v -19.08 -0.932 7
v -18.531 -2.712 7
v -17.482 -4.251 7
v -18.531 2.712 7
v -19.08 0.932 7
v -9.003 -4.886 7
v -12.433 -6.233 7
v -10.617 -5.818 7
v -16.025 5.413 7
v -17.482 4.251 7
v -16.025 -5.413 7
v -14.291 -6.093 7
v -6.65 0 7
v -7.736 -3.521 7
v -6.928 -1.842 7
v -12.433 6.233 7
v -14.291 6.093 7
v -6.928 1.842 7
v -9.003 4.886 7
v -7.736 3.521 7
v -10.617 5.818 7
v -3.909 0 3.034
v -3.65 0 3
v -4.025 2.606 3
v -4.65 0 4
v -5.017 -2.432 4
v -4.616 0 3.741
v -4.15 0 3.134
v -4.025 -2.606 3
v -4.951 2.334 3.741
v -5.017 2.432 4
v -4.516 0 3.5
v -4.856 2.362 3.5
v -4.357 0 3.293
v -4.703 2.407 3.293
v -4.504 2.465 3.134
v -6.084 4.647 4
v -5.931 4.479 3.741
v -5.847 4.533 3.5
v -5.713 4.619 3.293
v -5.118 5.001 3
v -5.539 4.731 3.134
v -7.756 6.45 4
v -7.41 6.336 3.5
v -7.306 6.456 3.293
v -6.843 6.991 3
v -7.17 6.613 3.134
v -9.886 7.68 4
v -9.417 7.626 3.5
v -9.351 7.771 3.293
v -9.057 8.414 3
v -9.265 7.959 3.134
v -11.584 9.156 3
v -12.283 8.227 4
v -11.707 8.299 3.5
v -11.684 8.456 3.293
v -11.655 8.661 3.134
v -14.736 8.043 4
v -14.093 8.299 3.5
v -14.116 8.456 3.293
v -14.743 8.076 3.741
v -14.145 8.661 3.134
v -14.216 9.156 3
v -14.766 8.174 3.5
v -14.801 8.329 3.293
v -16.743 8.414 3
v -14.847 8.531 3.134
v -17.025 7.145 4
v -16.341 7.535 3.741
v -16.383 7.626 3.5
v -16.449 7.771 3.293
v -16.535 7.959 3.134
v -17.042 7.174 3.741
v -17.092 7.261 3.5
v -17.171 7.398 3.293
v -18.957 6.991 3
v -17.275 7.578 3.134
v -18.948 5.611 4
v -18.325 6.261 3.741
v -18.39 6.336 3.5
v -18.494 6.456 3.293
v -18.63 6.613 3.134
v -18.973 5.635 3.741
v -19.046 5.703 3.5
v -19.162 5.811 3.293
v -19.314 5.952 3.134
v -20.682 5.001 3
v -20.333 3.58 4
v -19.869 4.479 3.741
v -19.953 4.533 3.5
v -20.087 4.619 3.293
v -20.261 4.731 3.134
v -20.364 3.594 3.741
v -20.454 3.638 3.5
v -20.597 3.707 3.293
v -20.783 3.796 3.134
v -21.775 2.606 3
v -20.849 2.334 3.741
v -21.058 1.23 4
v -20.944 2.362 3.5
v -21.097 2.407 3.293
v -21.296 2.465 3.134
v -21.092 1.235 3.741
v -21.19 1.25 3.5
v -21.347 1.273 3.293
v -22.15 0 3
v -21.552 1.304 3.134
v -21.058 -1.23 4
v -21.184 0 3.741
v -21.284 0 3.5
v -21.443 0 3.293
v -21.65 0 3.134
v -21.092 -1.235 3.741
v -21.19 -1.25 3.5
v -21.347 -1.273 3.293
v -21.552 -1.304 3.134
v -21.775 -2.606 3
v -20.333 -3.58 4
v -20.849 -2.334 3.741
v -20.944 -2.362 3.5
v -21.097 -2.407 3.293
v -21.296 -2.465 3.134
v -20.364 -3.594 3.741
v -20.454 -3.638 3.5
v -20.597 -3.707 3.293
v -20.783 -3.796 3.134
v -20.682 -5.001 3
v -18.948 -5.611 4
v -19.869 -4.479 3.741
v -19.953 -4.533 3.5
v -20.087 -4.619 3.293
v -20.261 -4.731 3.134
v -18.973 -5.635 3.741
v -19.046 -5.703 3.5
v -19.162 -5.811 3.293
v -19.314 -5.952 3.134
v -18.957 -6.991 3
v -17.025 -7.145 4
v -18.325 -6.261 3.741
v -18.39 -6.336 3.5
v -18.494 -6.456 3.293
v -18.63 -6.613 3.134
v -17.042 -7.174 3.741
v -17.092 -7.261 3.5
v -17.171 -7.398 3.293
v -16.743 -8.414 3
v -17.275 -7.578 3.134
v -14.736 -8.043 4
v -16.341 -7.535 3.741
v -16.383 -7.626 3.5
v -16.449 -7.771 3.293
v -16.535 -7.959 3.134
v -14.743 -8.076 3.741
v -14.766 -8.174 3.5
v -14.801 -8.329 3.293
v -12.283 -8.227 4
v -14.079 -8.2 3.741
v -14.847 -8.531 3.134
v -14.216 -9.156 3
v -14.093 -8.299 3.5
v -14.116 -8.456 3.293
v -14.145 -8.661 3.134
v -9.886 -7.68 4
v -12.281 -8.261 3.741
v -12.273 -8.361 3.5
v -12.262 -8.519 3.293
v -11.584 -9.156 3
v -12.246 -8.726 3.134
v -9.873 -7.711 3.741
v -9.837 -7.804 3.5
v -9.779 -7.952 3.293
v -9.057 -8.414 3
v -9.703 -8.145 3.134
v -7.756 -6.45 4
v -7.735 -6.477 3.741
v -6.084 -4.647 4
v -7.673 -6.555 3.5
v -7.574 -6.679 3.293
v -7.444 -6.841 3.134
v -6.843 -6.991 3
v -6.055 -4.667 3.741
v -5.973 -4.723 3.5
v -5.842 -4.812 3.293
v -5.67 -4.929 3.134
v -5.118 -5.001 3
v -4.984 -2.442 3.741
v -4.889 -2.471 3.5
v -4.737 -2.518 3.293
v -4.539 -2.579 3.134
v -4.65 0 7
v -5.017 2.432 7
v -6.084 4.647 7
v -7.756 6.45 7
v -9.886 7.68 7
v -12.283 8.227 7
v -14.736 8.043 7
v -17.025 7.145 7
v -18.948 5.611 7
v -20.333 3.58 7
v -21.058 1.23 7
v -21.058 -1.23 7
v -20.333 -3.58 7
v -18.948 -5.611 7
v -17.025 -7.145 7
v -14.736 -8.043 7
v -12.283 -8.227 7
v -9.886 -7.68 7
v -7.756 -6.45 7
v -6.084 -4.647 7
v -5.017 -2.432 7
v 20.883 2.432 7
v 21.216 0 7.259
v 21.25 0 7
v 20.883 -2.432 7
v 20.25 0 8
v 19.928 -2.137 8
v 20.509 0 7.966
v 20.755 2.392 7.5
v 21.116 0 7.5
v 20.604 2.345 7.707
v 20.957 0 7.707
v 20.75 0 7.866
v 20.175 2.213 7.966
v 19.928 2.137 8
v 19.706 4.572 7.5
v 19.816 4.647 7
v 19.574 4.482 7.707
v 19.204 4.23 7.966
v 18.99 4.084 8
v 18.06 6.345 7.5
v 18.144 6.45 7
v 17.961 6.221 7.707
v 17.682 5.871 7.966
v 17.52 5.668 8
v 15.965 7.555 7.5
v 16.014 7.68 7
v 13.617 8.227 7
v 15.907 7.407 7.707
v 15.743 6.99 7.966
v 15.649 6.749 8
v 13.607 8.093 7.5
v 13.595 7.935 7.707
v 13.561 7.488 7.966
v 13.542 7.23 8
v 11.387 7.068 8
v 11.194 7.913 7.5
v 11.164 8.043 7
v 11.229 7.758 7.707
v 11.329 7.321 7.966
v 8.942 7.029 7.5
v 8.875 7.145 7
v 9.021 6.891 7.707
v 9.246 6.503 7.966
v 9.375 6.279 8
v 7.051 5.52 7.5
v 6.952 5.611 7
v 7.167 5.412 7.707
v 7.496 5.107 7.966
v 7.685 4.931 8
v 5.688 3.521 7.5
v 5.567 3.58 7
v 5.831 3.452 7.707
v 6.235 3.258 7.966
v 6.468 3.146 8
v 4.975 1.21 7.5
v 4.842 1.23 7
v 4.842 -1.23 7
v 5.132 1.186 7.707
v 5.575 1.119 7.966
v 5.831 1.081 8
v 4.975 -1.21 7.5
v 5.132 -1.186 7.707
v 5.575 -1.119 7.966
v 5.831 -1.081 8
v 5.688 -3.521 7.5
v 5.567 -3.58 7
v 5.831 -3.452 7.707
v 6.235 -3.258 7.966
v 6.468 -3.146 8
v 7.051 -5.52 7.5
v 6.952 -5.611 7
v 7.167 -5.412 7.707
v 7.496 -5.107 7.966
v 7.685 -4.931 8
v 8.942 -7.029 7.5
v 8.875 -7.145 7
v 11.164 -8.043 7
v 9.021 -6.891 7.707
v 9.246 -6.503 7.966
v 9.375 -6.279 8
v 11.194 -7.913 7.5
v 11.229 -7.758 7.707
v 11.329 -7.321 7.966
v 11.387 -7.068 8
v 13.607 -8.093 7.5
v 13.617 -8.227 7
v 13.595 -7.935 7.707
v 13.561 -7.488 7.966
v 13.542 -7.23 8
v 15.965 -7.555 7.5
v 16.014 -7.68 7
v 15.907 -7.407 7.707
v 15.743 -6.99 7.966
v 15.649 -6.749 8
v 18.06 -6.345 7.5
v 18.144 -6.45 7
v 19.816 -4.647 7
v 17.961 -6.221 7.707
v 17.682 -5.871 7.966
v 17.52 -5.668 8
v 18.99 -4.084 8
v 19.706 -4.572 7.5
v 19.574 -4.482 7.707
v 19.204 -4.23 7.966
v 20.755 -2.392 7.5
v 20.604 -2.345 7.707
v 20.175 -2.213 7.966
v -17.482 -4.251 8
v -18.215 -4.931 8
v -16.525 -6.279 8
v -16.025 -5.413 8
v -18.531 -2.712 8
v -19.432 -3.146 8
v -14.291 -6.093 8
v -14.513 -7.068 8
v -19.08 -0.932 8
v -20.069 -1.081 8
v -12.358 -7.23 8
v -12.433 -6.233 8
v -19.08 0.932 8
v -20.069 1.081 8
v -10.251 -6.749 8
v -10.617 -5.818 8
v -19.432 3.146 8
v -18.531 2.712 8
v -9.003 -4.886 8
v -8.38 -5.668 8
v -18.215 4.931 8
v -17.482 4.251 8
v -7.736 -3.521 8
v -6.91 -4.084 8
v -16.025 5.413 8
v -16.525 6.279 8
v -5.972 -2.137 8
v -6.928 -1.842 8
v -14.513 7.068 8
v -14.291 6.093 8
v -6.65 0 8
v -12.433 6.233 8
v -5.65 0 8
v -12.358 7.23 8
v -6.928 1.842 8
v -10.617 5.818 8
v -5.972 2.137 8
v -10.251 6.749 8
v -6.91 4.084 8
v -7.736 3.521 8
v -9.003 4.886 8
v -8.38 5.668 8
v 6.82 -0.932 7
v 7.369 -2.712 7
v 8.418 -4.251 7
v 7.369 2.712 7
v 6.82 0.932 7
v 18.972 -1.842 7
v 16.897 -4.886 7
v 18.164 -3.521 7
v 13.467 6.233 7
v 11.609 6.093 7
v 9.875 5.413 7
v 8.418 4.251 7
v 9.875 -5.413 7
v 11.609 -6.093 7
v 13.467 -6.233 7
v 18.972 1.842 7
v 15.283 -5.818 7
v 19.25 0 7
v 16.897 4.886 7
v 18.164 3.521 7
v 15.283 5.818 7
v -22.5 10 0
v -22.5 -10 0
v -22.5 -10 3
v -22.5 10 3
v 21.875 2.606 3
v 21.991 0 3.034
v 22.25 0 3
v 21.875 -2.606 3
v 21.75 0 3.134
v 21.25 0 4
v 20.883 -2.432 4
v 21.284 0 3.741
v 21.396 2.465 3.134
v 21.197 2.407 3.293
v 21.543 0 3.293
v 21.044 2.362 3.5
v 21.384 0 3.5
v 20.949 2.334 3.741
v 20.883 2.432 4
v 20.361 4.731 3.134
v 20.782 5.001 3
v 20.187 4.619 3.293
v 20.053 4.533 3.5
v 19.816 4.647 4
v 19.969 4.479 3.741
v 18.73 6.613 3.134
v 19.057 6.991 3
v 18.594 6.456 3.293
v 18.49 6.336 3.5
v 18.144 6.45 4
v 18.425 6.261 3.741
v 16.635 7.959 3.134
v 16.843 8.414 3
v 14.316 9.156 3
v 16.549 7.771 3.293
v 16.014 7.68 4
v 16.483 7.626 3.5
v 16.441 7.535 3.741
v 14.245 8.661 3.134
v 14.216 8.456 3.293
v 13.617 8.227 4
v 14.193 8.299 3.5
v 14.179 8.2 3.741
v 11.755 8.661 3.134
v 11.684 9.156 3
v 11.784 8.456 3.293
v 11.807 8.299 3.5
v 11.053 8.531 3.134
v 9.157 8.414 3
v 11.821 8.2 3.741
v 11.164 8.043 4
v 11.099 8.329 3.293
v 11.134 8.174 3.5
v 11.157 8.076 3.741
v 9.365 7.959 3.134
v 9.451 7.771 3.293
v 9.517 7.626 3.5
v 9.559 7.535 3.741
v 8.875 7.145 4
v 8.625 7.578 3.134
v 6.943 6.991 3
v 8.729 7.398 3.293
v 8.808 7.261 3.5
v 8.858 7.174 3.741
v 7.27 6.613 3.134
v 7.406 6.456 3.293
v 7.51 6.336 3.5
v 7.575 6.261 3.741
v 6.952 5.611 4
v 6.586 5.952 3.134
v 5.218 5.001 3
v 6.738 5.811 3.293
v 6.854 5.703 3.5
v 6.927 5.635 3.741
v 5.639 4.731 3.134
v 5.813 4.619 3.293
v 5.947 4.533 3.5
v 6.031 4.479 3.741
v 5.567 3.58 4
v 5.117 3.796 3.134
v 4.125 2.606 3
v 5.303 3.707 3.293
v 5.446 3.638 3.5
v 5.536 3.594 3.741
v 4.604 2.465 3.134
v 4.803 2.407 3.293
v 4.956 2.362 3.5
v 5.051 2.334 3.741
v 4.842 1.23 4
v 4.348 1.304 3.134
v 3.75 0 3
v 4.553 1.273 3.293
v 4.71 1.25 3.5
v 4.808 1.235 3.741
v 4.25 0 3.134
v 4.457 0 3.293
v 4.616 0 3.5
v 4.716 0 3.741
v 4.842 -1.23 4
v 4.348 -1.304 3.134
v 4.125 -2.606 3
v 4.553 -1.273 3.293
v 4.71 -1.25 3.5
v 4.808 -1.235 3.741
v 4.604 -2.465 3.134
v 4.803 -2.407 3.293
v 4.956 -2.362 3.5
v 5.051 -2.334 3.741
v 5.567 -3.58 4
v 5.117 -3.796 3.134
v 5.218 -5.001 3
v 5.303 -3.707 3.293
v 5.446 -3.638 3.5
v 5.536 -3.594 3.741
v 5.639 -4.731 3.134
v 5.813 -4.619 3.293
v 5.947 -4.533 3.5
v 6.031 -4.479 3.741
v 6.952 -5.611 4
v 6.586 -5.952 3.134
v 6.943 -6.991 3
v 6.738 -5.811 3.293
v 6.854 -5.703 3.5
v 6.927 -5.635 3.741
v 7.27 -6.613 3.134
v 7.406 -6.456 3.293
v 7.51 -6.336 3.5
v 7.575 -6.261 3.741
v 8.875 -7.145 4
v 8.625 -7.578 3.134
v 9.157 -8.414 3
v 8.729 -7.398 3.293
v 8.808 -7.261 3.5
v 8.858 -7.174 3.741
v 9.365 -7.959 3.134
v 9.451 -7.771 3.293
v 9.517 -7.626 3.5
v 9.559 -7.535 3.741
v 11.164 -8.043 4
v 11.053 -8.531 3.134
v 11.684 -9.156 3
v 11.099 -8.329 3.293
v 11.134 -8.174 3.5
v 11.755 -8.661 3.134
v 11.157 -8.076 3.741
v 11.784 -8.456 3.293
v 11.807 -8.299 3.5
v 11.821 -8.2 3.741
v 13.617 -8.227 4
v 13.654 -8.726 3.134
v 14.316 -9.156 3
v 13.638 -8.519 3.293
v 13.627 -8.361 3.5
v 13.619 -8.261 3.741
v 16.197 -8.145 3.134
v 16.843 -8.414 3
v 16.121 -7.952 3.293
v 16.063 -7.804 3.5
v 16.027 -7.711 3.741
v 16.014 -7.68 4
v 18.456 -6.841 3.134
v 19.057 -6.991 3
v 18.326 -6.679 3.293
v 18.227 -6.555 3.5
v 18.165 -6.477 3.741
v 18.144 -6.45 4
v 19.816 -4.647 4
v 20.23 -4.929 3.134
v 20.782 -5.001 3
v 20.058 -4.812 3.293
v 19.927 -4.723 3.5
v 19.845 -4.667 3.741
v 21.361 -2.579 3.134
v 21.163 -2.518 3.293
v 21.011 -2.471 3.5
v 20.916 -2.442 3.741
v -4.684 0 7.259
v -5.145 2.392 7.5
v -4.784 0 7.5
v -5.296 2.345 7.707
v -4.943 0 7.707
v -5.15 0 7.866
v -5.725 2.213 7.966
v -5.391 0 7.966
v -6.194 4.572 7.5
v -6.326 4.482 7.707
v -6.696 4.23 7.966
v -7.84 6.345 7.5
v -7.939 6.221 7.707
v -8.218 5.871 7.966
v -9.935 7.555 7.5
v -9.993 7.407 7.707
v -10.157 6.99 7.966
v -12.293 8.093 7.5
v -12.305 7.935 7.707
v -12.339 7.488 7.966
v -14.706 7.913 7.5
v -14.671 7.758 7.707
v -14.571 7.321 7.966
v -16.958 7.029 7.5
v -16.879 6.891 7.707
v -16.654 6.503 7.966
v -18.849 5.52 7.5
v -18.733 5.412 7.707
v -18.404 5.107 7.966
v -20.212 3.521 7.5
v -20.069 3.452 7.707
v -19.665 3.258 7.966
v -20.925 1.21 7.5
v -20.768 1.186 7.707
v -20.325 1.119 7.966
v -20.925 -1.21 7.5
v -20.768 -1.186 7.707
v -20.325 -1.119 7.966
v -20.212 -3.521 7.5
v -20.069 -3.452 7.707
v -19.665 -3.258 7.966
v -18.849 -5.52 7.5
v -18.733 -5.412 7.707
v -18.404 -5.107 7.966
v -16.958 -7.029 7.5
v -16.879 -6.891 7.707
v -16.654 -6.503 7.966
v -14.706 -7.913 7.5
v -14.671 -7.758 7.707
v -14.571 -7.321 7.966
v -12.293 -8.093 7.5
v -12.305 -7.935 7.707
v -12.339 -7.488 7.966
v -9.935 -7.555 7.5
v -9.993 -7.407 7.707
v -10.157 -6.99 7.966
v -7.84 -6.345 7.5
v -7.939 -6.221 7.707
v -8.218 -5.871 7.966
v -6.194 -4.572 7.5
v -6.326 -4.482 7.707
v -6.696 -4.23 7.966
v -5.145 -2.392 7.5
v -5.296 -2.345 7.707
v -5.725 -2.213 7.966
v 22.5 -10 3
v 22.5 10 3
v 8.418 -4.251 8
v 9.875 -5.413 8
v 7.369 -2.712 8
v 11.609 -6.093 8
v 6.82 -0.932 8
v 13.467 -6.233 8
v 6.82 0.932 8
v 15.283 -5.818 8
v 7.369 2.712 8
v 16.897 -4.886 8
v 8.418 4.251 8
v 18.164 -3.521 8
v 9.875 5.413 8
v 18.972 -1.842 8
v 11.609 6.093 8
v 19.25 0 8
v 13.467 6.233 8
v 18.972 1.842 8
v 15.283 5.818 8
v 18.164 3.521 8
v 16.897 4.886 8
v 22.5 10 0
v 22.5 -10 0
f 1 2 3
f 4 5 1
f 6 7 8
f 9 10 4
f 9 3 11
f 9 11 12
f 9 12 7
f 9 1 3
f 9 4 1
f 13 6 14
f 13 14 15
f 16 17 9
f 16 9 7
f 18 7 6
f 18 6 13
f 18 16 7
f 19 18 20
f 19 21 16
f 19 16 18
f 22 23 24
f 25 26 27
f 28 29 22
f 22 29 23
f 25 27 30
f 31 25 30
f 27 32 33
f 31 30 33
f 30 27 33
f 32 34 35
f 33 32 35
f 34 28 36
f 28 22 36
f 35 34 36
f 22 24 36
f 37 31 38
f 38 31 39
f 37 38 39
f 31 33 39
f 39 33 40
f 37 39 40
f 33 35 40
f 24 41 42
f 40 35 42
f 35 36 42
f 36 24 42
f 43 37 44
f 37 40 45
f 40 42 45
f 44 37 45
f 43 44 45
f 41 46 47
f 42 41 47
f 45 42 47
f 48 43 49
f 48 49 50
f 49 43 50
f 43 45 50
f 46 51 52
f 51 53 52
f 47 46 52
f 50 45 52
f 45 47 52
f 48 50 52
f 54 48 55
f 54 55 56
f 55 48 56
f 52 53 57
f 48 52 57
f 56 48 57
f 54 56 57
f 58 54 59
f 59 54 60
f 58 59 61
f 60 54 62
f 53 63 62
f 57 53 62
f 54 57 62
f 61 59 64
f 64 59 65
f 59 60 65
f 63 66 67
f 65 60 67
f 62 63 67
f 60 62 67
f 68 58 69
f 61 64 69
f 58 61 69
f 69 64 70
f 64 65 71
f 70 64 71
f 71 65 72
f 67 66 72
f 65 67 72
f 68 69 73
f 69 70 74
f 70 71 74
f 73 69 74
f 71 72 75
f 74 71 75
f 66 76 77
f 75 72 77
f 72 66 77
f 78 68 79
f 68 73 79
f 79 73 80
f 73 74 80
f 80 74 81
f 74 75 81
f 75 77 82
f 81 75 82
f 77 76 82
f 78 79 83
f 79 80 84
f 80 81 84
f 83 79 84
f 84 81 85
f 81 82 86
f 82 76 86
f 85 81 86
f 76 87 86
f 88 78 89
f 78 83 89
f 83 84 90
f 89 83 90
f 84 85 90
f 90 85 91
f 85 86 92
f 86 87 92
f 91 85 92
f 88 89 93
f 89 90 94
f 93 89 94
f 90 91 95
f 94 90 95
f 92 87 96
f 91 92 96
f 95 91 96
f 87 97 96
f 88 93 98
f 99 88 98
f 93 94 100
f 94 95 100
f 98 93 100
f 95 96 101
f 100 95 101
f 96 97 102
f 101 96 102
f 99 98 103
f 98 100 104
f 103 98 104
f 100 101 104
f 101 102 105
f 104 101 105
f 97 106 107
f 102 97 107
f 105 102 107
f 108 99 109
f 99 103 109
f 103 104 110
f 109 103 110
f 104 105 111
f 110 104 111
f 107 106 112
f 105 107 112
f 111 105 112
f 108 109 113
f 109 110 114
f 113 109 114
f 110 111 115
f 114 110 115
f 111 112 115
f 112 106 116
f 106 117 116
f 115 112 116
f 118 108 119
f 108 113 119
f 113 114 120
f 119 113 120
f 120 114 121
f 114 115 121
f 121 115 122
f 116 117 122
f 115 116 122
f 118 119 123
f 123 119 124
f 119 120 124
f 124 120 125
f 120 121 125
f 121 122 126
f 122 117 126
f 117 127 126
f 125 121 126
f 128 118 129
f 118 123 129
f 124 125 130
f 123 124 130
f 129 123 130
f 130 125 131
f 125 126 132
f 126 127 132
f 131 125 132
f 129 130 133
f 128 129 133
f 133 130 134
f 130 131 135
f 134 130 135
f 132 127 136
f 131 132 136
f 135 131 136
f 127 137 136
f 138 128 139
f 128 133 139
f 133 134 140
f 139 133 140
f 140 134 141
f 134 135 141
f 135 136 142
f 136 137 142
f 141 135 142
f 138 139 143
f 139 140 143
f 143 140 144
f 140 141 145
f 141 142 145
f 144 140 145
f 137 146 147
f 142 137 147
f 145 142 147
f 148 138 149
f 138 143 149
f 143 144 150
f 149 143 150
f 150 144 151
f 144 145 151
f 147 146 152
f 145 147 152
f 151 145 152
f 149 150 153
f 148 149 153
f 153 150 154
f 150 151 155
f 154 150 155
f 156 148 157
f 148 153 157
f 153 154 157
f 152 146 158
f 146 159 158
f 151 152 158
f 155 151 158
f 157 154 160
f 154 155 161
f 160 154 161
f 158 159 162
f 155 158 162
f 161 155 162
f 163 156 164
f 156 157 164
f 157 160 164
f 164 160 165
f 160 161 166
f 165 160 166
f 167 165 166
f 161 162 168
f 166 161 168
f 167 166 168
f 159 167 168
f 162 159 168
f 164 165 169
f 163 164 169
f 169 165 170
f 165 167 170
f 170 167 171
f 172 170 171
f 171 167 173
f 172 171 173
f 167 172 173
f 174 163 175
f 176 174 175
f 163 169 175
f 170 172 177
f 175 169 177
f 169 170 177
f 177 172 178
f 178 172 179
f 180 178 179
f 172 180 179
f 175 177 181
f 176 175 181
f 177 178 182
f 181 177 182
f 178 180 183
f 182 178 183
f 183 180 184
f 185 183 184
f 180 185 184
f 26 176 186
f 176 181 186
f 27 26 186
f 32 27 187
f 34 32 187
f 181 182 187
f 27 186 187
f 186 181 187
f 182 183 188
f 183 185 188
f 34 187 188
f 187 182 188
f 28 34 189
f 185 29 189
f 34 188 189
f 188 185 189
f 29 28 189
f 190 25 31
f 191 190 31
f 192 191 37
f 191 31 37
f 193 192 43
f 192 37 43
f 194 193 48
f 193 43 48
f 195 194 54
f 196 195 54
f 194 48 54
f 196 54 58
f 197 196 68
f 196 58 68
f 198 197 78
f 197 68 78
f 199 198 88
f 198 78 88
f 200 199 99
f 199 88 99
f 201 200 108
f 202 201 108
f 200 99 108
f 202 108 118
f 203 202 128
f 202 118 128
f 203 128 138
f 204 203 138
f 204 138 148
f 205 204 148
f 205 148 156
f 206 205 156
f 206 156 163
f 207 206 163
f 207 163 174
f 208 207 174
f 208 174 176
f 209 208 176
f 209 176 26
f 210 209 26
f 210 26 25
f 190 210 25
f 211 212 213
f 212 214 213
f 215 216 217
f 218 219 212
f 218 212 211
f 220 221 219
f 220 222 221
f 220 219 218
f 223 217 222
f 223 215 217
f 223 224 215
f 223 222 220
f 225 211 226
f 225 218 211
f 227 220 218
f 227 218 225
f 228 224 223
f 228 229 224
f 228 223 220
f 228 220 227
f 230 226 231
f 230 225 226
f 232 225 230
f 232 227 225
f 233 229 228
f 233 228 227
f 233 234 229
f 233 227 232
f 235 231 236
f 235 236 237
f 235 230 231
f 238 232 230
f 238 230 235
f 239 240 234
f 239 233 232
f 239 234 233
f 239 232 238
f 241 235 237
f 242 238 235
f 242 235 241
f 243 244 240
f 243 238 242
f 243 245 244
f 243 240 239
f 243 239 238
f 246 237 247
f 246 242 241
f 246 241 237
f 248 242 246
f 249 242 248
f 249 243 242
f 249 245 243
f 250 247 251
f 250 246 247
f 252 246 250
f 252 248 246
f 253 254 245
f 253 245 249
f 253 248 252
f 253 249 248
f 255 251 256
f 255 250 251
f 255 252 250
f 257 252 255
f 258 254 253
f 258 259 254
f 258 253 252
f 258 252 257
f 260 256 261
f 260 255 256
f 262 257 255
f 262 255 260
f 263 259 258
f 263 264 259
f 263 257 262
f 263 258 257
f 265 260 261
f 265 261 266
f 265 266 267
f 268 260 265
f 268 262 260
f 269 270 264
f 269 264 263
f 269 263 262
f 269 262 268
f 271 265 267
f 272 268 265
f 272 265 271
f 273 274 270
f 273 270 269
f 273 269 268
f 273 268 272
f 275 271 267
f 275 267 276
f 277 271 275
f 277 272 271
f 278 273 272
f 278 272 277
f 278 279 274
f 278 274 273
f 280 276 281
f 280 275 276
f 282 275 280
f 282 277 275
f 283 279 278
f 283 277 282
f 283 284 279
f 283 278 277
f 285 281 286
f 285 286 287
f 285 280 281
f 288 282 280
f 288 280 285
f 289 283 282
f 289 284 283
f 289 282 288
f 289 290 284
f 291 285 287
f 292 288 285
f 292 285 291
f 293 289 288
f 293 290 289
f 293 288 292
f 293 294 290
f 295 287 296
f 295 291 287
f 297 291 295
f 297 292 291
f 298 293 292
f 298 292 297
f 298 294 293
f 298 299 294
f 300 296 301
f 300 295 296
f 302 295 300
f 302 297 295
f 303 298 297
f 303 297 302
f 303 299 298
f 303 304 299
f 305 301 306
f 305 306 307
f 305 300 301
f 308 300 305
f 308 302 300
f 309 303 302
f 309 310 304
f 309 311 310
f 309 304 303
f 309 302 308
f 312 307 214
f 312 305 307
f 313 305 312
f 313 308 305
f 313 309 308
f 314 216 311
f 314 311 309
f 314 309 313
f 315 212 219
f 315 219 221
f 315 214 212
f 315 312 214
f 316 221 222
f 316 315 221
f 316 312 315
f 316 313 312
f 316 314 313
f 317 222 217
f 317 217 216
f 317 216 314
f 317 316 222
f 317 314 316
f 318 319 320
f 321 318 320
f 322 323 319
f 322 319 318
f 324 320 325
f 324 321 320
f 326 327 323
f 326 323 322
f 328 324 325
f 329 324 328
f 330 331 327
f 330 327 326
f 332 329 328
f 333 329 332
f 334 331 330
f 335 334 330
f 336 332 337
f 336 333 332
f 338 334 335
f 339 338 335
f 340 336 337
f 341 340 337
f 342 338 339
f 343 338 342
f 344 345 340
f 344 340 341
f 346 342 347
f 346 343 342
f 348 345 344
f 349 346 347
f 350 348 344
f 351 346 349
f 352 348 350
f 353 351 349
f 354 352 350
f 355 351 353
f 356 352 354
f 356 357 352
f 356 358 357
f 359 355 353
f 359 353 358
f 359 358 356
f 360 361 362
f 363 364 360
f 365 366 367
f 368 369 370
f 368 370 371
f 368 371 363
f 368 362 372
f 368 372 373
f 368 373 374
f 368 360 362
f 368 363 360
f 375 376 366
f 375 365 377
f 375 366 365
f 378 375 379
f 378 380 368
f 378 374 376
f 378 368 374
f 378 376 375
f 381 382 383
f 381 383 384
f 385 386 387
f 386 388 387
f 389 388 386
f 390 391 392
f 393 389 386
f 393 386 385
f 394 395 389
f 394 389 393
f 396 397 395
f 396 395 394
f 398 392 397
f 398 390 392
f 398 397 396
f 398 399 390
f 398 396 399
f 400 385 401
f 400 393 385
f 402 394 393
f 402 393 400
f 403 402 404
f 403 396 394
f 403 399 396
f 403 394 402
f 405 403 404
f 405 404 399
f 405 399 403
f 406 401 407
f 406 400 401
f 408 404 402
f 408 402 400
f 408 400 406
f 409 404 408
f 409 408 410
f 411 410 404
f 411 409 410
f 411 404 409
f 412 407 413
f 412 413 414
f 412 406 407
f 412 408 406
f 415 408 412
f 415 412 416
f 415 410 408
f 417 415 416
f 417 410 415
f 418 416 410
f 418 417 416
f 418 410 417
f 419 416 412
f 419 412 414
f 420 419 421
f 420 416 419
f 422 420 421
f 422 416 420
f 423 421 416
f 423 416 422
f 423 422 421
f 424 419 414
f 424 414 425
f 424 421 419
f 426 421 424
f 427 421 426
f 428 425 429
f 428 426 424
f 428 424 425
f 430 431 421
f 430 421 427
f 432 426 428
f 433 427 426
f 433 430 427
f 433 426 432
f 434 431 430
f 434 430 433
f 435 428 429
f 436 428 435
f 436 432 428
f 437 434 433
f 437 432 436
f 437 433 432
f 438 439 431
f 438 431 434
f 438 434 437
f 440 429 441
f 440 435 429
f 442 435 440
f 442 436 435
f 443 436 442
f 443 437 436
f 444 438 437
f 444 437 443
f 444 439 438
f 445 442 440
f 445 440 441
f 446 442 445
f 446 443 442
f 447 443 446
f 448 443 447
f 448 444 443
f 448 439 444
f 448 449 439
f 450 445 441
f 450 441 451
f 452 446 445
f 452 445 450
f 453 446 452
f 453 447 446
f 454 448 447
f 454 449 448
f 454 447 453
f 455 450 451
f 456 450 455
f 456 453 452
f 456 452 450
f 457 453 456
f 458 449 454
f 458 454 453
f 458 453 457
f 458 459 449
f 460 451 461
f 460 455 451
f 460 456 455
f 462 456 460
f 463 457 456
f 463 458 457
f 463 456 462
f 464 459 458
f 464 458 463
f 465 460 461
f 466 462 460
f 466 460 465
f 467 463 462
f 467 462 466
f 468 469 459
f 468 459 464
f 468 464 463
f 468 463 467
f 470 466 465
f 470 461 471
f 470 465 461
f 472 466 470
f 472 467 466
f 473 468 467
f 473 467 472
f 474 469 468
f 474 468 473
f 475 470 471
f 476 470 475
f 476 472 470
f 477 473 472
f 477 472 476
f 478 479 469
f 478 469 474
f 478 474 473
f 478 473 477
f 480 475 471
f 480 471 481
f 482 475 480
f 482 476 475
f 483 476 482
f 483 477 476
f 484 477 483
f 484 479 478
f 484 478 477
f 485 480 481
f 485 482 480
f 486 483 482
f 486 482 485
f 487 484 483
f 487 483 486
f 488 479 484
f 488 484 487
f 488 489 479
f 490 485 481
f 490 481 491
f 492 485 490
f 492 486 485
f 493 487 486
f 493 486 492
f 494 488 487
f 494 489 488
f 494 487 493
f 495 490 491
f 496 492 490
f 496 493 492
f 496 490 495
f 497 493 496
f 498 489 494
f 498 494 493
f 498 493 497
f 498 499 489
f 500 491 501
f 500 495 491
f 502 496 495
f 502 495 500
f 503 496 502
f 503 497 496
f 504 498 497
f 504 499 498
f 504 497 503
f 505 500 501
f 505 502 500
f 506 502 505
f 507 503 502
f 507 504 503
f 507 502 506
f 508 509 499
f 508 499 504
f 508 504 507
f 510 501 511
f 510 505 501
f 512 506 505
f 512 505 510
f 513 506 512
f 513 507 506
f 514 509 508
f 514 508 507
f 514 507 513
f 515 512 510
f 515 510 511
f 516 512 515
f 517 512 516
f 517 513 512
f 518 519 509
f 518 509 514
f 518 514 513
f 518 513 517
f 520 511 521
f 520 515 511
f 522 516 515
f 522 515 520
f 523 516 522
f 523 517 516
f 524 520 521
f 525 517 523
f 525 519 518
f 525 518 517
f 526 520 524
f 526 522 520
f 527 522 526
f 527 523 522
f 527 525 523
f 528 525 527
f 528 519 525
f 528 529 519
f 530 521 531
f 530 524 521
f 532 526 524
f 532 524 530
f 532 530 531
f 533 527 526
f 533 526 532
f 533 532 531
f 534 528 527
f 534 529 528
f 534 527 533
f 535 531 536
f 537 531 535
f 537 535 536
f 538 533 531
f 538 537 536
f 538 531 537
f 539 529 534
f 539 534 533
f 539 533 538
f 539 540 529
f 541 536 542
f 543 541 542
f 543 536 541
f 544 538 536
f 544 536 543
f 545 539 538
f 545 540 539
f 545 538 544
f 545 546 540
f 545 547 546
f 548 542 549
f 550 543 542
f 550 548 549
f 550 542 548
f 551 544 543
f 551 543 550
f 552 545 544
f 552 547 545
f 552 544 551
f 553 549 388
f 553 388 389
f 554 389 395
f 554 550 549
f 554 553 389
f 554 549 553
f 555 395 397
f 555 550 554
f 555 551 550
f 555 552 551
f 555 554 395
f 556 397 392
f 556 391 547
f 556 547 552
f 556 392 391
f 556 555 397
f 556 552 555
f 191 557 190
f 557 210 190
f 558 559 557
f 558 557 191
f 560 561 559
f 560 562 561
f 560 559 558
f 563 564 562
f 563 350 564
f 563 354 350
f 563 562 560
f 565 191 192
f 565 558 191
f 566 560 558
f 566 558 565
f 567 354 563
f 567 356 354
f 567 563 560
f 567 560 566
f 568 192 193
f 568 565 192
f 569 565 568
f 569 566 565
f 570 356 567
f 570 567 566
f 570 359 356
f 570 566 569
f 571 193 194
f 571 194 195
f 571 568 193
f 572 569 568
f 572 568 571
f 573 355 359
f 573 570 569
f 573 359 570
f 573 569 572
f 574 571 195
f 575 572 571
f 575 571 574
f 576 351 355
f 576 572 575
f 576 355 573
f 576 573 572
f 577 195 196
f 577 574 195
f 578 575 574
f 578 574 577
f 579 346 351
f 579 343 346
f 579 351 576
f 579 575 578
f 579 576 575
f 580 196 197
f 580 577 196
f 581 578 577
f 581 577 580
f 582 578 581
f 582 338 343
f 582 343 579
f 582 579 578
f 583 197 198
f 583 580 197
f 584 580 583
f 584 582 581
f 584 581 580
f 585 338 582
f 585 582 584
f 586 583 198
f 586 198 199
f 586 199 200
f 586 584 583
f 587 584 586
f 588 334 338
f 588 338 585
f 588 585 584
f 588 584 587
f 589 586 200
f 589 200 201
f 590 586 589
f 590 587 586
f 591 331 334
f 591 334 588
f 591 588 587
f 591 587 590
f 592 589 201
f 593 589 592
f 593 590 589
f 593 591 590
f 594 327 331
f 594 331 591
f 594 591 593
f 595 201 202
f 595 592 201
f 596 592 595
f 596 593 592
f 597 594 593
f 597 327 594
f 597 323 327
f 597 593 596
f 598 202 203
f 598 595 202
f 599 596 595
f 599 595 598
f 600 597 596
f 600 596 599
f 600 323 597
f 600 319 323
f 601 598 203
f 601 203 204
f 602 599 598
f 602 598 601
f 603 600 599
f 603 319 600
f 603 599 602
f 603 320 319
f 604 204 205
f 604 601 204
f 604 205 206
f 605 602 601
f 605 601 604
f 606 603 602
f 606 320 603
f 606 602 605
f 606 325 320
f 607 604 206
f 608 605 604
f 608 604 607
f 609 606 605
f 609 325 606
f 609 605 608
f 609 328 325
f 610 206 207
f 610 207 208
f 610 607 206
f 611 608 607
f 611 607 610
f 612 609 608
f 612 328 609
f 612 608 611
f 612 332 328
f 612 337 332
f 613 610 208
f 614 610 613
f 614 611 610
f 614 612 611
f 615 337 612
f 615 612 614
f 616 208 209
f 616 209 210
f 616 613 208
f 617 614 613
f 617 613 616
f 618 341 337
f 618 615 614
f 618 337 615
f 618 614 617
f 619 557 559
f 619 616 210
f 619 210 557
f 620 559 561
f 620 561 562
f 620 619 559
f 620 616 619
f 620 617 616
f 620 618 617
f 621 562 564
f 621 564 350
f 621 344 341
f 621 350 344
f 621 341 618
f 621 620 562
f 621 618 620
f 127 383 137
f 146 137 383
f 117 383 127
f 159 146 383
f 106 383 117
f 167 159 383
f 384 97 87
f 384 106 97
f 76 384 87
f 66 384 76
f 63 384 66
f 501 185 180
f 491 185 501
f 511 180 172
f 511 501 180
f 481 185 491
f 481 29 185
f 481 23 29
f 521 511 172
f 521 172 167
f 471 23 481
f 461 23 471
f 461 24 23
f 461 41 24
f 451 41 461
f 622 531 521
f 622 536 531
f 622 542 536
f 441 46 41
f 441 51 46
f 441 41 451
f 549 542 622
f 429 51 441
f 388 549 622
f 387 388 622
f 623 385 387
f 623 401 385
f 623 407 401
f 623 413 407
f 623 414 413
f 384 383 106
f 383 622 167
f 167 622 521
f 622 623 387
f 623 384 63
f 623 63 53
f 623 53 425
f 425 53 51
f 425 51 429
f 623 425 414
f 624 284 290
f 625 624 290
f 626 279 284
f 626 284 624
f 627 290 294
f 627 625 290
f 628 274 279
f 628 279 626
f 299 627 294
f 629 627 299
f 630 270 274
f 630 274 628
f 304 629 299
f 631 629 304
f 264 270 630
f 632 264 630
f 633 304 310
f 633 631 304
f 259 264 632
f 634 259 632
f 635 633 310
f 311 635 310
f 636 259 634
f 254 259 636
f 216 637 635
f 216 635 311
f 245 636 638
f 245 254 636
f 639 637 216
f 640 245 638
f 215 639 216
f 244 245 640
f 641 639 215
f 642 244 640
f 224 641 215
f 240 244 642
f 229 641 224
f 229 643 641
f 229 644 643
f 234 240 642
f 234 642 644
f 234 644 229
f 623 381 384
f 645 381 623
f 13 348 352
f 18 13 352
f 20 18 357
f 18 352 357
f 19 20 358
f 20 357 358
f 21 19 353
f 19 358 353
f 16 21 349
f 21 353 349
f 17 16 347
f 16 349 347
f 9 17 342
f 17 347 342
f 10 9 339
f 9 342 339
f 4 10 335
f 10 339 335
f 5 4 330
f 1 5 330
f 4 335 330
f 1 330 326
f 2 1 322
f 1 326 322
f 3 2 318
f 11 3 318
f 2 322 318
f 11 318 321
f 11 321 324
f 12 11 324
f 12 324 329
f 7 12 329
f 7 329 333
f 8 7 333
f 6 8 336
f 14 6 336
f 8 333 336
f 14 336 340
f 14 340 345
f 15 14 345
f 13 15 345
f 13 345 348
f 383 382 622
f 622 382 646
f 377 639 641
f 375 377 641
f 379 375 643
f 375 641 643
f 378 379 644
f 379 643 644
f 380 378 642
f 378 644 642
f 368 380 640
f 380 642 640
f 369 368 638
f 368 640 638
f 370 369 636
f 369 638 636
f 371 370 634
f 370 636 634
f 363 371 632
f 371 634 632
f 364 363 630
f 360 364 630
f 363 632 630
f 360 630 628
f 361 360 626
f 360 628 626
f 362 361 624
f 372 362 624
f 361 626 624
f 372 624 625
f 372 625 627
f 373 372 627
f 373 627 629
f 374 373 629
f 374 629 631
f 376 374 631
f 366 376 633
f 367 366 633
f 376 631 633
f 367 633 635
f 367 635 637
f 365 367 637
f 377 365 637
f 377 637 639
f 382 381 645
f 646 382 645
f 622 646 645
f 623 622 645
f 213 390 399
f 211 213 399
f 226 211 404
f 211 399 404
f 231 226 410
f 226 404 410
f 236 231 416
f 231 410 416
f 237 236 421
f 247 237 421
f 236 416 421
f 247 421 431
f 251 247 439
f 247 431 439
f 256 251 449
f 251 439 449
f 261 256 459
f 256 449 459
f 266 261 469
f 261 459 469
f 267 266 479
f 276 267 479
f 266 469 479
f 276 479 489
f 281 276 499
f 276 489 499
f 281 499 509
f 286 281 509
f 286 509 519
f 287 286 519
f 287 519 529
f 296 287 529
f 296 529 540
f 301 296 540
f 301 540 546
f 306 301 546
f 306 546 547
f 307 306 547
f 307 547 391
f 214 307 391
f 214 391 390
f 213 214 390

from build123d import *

# Parameters (mm, degrees)
SKETCH_1_W          = 45
SKETCH_1_H          = 20
EXTRUDE_1_DEPTH     = 3
SKETCH_1_3_R        = 8.25
EXTRUDE_2_DEPTH     = 8
SKETCH_2_R          = 6.25
CUT_EXTRUDE_1_DEPTH = 1
FILLET_1_R          = 1


with BuildPart() as part:
    # 草图1 → 凸台-拉伸1 (new body)
    with BuildSketch(Plane.XY):
        Rectangle(SKETCH_1_W, SKETCH_1_H)
    extrude(amount=EXTRUDE_1_DEPTH)

    # 草图1<3> → 凸台-拉伸2 (add)
    with BuildSketch(Plane.XY):
        with Locations((-12.9, 0)):
            Circle(SKETCH_1_3_R)
        with Locations((13, 0)):
            Circle(SKETCH_1_3_R)
    extrude(amount=EXTRUDE_2_DEPTH)

    # 草图2 → 切除-拉伸1 (cut)
    with BuildSketch(Plane.XY.offset(8)):
        with Locations((13, 0)):
            Circle(SKETCH_2_R)
        with Locations((-12.9, 0)):
            Circle(SKETCH_2_R)
    extrude(amount=-CUT_EXTRUDE_1_DEPTH, mode=Mode.SUBTRACT)

    # 圆角1
    fillet_1_edges = [part.edges().sort_by_distance(p)[0] for p in [
        (4.75, 0, 8),
        (4.75, 0, 3),
        (-21.15, 0, 8),
        (-21.15, 0, 3),
    ]]
    fillet(fillet_1_edges, radius=FILLET_1_R)


solid = part.part
